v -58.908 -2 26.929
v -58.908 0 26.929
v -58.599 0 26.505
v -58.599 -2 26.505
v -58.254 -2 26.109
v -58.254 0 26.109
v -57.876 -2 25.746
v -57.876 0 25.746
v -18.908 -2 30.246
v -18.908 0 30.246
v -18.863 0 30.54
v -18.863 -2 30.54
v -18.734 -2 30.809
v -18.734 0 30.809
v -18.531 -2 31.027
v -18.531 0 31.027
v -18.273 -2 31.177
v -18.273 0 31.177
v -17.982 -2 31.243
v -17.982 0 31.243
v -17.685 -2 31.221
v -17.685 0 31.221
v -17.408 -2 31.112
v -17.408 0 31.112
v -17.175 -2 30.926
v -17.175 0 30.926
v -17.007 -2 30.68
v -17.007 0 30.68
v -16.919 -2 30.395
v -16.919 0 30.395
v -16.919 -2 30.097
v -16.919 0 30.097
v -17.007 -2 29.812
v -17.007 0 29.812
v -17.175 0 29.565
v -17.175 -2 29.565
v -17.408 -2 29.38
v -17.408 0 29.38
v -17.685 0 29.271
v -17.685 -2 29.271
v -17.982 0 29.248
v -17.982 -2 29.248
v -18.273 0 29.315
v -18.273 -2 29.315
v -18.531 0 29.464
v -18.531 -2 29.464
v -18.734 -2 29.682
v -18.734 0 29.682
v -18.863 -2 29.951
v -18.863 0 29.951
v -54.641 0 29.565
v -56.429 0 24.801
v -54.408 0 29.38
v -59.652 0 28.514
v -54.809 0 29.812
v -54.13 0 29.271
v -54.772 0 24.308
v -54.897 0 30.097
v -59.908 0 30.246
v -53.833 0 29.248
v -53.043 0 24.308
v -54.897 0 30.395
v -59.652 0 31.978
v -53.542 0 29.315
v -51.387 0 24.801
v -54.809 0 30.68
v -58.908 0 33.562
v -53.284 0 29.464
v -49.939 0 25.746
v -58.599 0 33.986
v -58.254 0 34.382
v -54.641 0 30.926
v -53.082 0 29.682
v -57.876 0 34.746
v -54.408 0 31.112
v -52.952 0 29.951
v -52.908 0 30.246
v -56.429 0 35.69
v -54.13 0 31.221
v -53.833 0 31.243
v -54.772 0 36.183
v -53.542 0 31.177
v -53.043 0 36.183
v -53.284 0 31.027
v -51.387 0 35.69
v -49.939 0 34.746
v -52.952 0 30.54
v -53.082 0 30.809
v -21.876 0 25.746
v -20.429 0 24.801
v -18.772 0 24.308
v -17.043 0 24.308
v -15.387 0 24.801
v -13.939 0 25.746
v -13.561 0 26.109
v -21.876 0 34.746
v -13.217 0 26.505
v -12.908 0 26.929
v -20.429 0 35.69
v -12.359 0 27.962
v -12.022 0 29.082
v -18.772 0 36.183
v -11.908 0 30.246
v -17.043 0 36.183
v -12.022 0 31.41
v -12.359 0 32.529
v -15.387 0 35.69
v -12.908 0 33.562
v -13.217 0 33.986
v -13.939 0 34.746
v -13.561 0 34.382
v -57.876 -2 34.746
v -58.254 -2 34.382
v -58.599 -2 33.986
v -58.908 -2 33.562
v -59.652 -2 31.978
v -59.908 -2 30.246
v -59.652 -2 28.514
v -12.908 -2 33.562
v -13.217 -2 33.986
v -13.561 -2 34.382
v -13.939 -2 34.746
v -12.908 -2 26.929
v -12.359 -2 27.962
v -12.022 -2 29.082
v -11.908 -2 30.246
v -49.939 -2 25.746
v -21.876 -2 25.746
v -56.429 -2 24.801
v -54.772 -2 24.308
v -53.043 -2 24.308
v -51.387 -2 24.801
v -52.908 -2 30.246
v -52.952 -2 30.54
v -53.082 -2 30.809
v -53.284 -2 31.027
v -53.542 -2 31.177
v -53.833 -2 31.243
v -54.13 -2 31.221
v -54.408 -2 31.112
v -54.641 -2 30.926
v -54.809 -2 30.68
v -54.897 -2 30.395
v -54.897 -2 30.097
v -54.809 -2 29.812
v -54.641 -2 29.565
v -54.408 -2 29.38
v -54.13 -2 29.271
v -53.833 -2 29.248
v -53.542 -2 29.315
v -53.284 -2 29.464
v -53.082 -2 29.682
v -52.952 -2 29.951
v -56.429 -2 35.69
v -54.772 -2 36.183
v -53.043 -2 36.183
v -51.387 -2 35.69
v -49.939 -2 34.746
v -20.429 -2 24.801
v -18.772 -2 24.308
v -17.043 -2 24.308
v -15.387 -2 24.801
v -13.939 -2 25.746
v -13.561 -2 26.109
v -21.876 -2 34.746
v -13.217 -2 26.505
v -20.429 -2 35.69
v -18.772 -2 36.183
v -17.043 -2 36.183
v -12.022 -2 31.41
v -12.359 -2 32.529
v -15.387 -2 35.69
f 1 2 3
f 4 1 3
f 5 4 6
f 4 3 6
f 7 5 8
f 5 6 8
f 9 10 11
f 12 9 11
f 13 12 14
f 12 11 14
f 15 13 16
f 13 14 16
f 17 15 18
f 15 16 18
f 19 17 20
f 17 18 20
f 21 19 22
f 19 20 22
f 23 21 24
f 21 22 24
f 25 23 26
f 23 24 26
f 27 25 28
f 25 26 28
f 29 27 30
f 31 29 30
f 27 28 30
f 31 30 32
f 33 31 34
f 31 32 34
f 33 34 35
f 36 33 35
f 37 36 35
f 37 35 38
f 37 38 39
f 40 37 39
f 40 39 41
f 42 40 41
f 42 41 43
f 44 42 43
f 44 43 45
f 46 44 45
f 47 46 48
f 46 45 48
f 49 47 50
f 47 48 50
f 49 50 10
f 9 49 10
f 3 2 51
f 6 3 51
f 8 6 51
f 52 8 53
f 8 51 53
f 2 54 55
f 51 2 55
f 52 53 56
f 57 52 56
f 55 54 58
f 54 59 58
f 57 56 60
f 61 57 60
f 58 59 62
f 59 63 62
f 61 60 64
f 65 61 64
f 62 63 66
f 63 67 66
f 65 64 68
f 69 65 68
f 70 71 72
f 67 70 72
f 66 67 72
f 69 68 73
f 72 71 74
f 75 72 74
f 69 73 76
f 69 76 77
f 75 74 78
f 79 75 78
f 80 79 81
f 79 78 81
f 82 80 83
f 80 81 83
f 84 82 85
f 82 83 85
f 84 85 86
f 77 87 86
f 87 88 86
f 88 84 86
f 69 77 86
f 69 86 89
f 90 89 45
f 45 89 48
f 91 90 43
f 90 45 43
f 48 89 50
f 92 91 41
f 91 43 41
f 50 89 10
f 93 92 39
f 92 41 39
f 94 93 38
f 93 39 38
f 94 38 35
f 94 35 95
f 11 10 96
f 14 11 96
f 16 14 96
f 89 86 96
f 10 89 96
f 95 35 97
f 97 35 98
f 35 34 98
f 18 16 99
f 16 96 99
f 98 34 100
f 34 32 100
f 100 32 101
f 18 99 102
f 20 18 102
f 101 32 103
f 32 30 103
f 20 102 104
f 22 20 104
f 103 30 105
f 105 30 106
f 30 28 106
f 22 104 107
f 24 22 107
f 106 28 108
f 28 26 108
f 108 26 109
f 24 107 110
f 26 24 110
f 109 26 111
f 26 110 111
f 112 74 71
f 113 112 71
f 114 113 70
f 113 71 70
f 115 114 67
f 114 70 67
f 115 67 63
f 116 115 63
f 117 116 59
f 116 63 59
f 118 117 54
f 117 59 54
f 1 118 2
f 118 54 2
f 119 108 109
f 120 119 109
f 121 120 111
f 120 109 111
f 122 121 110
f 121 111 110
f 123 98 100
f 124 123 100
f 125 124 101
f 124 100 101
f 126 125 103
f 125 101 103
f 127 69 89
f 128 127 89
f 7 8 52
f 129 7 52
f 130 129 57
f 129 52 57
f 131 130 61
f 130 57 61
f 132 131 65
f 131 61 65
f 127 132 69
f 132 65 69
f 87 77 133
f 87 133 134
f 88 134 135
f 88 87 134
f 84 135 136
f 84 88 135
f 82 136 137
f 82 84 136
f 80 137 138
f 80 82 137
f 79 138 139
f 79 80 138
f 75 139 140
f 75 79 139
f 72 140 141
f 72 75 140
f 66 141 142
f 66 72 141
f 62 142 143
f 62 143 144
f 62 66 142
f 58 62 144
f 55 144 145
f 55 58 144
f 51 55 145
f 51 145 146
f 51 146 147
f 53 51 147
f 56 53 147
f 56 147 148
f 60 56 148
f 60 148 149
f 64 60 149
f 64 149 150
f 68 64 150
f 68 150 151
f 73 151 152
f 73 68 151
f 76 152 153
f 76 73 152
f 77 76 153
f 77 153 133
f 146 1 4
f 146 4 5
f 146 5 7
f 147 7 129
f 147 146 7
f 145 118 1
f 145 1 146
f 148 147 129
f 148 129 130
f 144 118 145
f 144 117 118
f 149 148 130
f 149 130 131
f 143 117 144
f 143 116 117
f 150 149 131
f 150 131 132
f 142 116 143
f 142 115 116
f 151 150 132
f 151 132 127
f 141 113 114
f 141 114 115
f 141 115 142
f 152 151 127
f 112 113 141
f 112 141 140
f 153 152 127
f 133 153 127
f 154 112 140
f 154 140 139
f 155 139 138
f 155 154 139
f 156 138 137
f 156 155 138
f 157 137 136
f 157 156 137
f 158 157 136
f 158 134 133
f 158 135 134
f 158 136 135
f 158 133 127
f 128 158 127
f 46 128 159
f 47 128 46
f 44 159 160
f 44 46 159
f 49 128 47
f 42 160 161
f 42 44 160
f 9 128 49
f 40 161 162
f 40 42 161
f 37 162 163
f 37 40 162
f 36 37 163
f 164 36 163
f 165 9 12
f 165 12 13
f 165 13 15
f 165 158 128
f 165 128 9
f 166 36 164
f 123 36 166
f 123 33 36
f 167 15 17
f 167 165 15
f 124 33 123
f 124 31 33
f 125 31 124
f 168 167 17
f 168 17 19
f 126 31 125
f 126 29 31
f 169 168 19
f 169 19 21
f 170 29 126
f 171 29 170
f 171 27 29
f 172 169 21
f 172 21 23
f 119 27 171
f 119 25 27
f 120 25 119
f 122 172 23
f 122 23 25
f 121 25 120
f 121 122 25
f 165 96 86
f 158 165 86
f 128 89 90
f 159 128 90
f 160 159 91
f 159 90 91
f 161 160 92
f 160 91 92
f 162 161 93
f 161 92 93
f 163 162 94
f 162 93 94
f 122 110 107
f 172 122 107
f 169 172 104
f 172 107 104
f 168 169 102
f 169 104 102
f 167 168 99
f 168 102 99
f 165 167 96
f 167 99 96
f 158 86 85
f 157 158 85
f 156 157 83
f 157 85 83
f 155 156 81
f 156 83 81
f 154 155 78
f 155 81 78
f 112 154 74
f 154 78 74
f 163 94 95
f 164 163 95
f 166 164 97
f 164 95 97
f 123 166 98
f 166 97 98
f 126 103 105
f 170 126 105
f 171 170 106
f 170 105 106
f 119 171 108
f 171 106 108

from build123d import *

# Parameters (mm, degrees)
F0_R     = 1
F1_DEPTH = 2


with BuildPart() as f1:
    # F0 (on Front) → F1 (new body)
    with BuildSketch(Plane.XZ):
        with BuildLine():
            ThreePointArc((-49.9391267766, 34.7456367077), (-53.9077537432, 36.2456367077), (-57.8763807098, 34.7456367077))
            Line((-57.8763807098, 34.7456367077), (-49.9391267766, 34.7456367077))
        make_face()
        with BuildLine():
            Line((-49.9391267766, 34.7456367077), (-57.8763807098, 34.7456367077))
            ThreePointArc((-57.8763807098, 34.7456367077), (-58.4309342214, 34.1878237101), (-58.9077537432, 33.562261498))
            Line((-58.9077537432, 33.562261498), (-58.9077537432, 26.9290119173))
            ThreePointArc((-58.9077537432, 26.9290119173), (-58.4309342214, 26.3034497053), (-57.8763807098, 25.7456367077))
            Line((-57.8763807098, 25.7456367077), (-49.9391267766, 25.7456367077))
            ThreePointArc((-49.9391267766, 25.7456367077), (-49.3845732651, 26.3034497053), (-48.9077537432, 26.9290119173))
            Line((-48.9077537432, 26.9290119173), (-48.9077537432, 30.2456367077))
            Line((-48.9077537432, 30.2456367077), (-48.9077537432, 33.562261498))
            ThreePointArc((-48.9077537432, 33.562261498), (-49.3845732651, 34.1878237101), (-49.9391267766, 34.7456367077))
        make_face()
        with Locations((-53.9077537432, 30.2456367077)):
            Circle(F0_R, mode=Mode.SUBTRACT)
        with BuildLine():
            Line((-58.9077537432, 26.9290119173), (-58.9077537432, 33.562261498))
            ThreePointArc((-58.9077537432, 33.562261498), (-59.9077537432, 30.2456367077), (-58.9077537432, 26.9290119173))
        make_face()
        with BuildLine():
            Line((-48.9077537432, 34.7456367077), (-49.9391267766, 34.7456367077))
            ThreePointArc((-49.9391267766, 34.7456367077), (-49.3845732651, 34.1878237101), (-48.9077537432, 33.562261498))
            Line((-48.9077537432, 33.562261498), (-48.9077537432, 34.7456367077))
        make_face()
        with BuildLine():
            Line((-22.9077537432, 34.7456367077), (-48.9077537432, 34.7456367077))
            Line((-48.9077537432, 34.7456367077), (-48.9077537432, 33.562261498))
            ThreePointArc((-48.9077537432, 33.562261498), (-48.1631910967, 31.9776875152), (-47.9077537432, 30.2456367077))
            ThreePointArc((-47.9077537432, 30.2456367077), (-48.1631910967, 28.5135859001), (-48.9077537432, 26.9290119173))
            Line((-48.9077537432, 26.9290119173), (-48.9077537432, 25.7456367077))
            Line((-48.9077537432, 25.7456367077), (-22.9077537432, 25.7456367077))
            Line((-22.9077537432, 25.7456367077), (-22.9077537432, 26.9290119173))
            ThreePointArc((-22.9077537432, 26.9290119173), (-23.9077537432, 30.2456367077), (-22.9077537432, 33.562261498))
            Line((-22.9077537432, 33.562261498), (-22.9077537432, 34.7456367077))
        make_face()
        with BuildLine():
            ThreePointArc((-47.9077537432, 30.2456367077), (-48.1631910967, 31.9776875152), (-48.9077537432, 33.562261498))
            Line((-48.9077537432, 33.562261498), (-48.9077537432, 30.2456367077))
            Line((-48.9077537432, 30.2456367077), (-48.9077537432, 26.9290119173))
            ThreePointArc((-48.9077537432, 26.9290119173), (-48.1631910967, 28.5135859001), (-47.9077537432, 30.2456367077))
        make_face()
        with BuildLine():
            Line((-49.9391267766, 25.7456367077), (-57.8763807098, 25.7456367077))
            ThreePointArc((-57.8763807098, 25.7456367077), (-53.9077537432, 24.2456367077), (-49.9391267766, 25.7456367077))
        make_face()
        with BuildLine():
            Line((-21.8763807098, 34.7456367077), (-22.9077537432, 34.7456367077))
            Line((-22.9077537432, 34.7456367077), (-22.9077537432, 33.562261498))
            ThreePointArc((-22.9077537432, 33.562261498), (-22.4309342214, 34.1878237101), (-21.8763807098, 34.7456367077))
        make_face()
        with BuildLine():
            ThreePointArc((-48.9077537432, 26.9290119173), (-49.3845732651, 26.3034497053), (-49.9391267766, 25.7456367077))
            Line((-49.9391267766, 25.7456367077), (-48.9077537432, 25.7456367077))
            Line((-48.9077537432, 25.7456367077), (-48.9077537432, 26.9290119173))
        make_face()
        with BuildLine():
            ThreePointArc((-13.9391267766, 34.7456367077), (-17.9077537432, 36.2456367077), (-21.8763807098, 34.7456367077))
            Line((-21.8763807098, 34.7456367077), (-13.9391267766, 34.7456367077))
        make_face()
        with BuildLine():
            Line((-13.9391267766, 34.7456367077), (-21.8763807098, 34.7456367077))
            ThreePointArc((-21.8763807098, 34.7456367077), (-22.4309342214, 34.1878237101), (-22.9077537432, 33.562261498))
            Line((-22.9077537432, 33.562261498), (-22.9077537432, 30.2456367077))
            Line((-22.9077537432, 30.2456367077), (-22.9077537432, 26.9290119173))
            ThreePointArc((-22.9077537432, 26.9290119173), (-22.4309342214, 26.3034497053), (-21.8763807098, 25.7456367077))
            Line((-21.8763807098, 25.7456367077), (-13.9391267766, 25.7456367077))
            ThreePointArc((-13.9391267766, 25.7456367077), (-13.3845732651, 26.3034497053), (-12.9077537432, 26.9290119173))
            Line((-12.9077537432, 26.9290119173), (-12.9077537432, 33.562261498))
            ThreePointArc((-12.9077537432, 33.562261498), (-13.3845732651, 34.1878237101), (-13.9391267766, 34.7456367077))
        make_face()
        with BuildLine():
            ThreePointArc((-16.9077537432, 30.2456367077), (-17.9077537432, 29.2456367077), (-18.9077537432, 30.2456367077))
            ThreePointArc((-18.9077537432, 30.2456367077), (-17.9077537432, 31.2456367077), (-16.9077537432, 30.2456367077))
        make_face(mode=Mode.SUBTRACT)
        with BuildLine():
            Line((-22.9077537432, 30.2456367077), (-22.9077537432, 33.562261498))
            ThreePointArc((-22.9077537432, 33.562261498), (-23.9077537432, 30.2456367077), (-22.9077537432, 26.9290119173))
            Line((-22.9077537432, 26.9290119173), (-22.9077537432, 30.2456367077))
        make_face()
        with BuildLine():
            ThreePointArc((-21.8763807098, 25.7456367077), (-22.4309342214, 26.3034497053), (-22.9077537432, 26.9290119173))
            Line((-22.9077537432, 26.9290119173), (-22.9077537432, 25.7456367077))
            Line((-22.9077537432, 25.7456367077), (-21.8763807098, 25.7456367077))
        make_face()
        with BuildLine():
            ThreePointArc((-11.9077537432, 30.2456367077), (-12.1631910967, 31.9776875152), (-12.9077537432, 33.562261498))
            Line((-12.9077537432, 33.562261498), (-12.9077537432, 26.9290119173))
            ThreePointArc((-12.9077537432, 26.9290119173), (-12.1631910967, 28.5135859001), (-11.9077537432, 30.2456367077))
        make_face()
        with BuildLine():
            Line((-13.9391267766, 25.7456367077), (-21.8763807098, 25.7456367077))
            ThreePointArc((-21.8763807098, 25.7456367077), (-17.9077537432, 24.2456367077), (-13.9391267766, 25.7456367077))
        make_face()
    extrude(amount=F1_DEPTH)


solid = f1.part
